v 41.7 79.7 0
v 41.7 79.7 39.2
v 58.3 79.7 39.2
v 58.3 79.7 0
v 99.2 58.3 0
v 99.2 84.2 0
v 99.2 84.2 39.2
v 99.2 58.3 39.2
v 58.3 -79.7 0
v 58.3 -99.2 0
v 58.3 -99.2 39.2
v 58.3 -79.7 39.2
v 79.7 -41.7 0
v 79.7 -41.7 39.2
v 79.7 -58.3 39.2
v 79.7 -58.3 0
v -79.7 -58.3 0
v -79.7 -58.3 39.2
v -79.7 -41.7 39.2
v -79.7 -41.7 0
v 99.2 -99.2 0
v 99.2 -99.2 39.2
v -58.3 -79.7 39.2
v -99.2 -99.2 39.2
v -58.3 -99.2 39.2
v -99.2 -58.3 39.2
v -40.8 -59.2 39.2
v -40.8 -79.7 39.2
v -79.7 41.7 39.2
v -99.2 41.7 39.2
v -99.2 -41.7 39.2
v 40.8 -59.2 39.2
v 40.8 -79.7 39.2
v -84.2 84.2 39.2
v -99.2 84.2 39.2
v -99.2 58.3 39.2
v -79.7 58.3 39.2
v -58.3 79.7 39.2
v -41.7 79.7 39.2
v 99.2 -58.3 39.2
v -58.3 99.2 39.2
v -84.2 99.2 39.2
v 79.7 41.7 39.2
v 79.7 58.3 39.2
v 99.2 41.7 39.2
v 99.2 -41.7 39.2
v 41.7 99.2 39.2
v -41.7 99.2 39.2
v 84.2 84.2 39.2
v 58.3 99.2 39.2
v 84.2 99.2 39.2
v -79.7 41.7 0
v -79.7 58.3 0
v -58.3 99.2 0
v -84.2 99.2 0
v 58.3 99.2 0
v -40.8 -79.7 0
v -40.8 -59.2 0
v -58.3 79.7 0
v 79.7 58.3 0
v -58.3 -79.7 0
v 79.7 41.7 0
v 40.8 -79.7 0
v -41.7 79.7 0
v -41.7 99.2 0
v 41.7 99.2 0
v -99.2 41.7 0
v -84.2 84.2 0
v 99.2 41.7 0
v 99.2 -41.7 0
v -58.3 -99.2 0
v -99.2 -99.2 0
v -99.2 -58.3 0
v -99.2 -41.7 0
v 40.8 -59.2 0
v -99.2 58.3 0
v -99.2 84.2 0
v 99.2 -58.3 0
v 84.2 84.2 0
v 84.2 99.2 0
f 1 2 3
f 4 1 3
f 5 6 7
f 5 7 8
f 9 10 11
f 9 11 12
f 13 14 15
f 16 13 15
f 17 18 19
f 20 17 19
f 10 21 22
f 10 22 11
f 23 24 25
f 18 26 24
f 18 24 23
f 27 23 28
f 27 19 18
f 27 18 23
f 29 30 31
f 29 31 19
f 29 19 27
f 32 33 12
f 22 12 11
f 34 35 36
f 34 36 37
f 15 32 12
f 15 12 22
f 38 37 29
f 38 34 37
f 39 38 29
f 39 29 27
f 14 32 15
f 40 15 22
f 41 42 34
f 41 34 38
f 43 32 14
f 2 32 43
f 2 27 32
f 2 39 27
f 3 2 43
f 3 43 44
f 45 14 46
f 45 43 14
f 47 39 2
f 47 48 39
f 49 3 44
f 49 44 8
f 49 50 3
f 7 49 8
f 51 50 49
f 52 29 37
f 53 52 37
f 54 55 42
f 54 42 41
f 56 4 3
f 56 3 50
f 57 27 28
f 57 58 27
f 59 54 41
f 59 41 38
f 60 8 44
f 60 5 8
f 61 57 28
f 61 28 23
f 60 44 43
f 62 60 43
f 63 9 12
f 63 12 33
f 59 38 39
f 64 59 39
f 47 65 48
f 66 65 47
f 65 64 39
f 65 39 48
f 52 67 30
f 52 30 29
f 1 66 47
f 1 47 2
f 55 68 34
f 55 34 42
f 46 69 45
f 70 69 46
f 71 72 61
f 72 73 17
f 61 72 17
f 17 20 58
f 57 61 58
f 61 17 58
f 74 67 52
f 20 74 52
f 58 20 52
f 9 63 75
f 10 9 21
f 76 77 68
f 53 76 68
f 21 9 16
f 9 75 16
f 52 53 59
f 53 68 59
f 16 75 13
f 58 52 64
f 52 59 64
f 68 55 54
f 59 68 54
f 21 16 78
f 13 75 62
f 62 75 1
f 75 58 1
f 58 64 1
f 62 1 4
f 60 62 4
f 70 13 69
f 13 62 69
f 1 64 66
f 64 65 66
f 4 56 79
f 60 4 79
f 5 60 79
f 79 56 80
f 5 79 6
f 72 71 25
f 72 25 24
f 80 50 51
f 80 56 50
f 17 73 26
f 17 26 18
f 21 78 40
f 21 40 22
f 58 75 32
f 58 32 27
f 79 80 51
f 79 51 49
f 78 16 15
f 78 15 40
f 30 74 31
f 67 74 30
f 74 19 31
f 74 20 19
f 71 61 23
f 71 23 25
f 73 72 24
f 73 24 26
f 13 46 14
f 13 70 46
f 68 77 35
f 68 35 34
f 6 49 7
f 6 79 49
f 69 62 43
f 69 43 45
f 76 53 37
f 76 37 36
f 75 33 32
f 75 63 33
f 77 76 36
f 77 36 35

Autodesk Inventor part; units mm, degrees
ref_plane "YZ Plane" through (0, 0, 0) normal (1, 0, 0) x (0, 1, 0)
ref_plane "XZ Plane" through (0, 0, 0) normal (0, 1, 0) x (-1, 0, 0)
sketch "Boceto1" plane through (0, 0, 0) normal (0, 0, 1) x (1, 0, 0)
  line L0 (40.8, -59.2) -> (-40.8, -59.2) projected
  line L1 (40.8, -79.7) -> (40.8, -59.2) projected
  line L2 (99.2, -99.2) -> (58.3, -99.2) projected
  line L3 (99.2, -58.3) -> (99.2, -99.2) projected
  line L4 (58.3, 99.2) -> (99.2, 99.2) projected
  line L5 (-99.2, 58.3) -> (-99.2, 99.2) projected
  line L6 (-58.3, -99.2) -> (-99.2, -99.2) projected
  line L7 (-40.8, -59.2) -> (-40.8, -79.7) projected
  line L8 (-40.8, -79.7) -> (-58.3, -79.7) projected
  line L9 (58.3, -79.7) -> (40.8, -79.7) projected
  line L10 (58.3, -99.2) -> (58.3, -79.7) projected
  line L11 (79.7, -58.3) -> (99.2, -58.3) projected
  line L12 (79.7, -41.7) -> (79.7, -58.3) projected
  line L13 (99.2, -41.7) -> (79.7, -41.7) projected
  line L14 (99.2, 41.7) -> (99.2, -41.7) projected
  line L15 (79.7, 41.7) -> (99.2, 41.7) projected
  line L16 (79.7, 58.3) -> (79.7, 41.7) projected
  line L17 (99.2, 58.3) -> (79.7, 58.3) projected
  line L18 (99.2, 99.2) -> (99.2, 58.3) projected
  line L19 (58.3, 79.7) -> (58.3, 99.2) projected
  line L20 (41.7, 79.7) -> (58.3, 79.7) projected
  line L21 (41.7, 99.2) -> (41.7, 79.7) projected
  line L22 (-41.7, 99.2) -> (41.7, 99.2) projected
  line L23 (-41.7, 79.7) -> (-41.7, 99.2) projected
  line L24 (-58.3, 79.7) -> (-41.7, 79.7) projected
  line L25 (-58.3, 99.2) -> (-58.3, 79.7) projected
  line L26 (-99.2, 99.2) -> (-58.3, 99.2) projected
  line L27 (-79.7, 58.3) -> (-99.2, 58.3) projected
  line L28 (-79.7, 41.7) -> (-79.7, 58.3) projected
  line L29 (-99.2, 41.7) -> (-79.7, 41.7) projected
  line L30 (-99.2, -41.7) -> (-99.2, 41.7) projected
  line L31 (-79.7, -41.7) -> (-99.2, -41.7) projected
  line L32 (-79.7, -58.3) -> (-79.7, -41.7) projected
  line L33 (-99.2, -58.3) -> (-79.7, -58.3) projected
  line L34 (-99.2, -99.2) -> (-99.2, -58.3) projected
  line L35 (-58.3, -79.7) -> (-58.3, -99.2) projected
  line L36 (99.2, 84.2) -> (99.2, 58.3) projected
  line L37 (84.2, 84.2) -> (99.2, 84.2) projected
  line L38 (84.2, 99.2) -> (84.2, 84.2) projected
  line L39 (58.3, 99.2) -> (84.2, 99.2) projected
  line L40 (58.3, 79.7) -> (58.3, 99.2) projected
  line L41 (41.7, 79.7) -> (58.3, 79.7) projected
  line L42 (41.7, 99.2) -> (41.7, 79.7) projected
  line L43 (-41.7, 99.2) -> (41.7, 99.2) projected
  line L44 (-41.7, 79.7) -> (-41.7, 99.2) projected
  line L45 (-58.3, 79.7) -> (-41.7, 79.7) projected
  line L46 (-58.3, 99.2) -> (-58.3, 79.7) projected
  line L47 (-84.2, 99.2) -> (-58.3, 99.2) projected
  line L48 (-84.2, 84.2) -> (-84.2, 99.2) projected
  line L49 (-99.2, 84.2) -> (-84.2, 84.2) projected
  line L50 (-99.2, 58.3) -> (-99.2, 84.2) projected
  line L51 (-79.7, 58.3) -> (-99.2, 58.3) projected
  line L52 (-79.7, 41.7) -> (-79.7, 58.3) projected
  line L53 (-99.2, 41.7) -> (-79.7, 41.7) projected
  line L54 (-99.2, -41.7) -> (-99.2, 41.7) projected
  line L55 (-79.7, -41.7) -> (-99.2, -41.7) projected
  line L56 (-79.7, -58.3) -> (-79.7, -41.7) projected
  line L57 (-99.2, -58.3) -> (-79.7, -58.3) projected
  line L58 (-99.2, -99.2) -> (-99.2, -58.3) projected
  line L59 (-58.3, -99.2) -> (-99.2, -99.2) projected
  line L60 (-58.3, -79.7) -> (-58.3, -99.2) projected
  line L61 (-40.8, -79.7) -> (-58.3, -79.7) projected
  line L62 (-40.8, -59.2) -> (-40.8, -79.7) projected
  line L63 (40.8, -59.2) -> (-40.8, -59.2) projected
  line L64 (40.8, -79.7) -> (40.8, -59.2) projected
  line L65 (58.3, -79.7) -> (40.8, -79.7) projected
  line L66 (58.3, -99.2) -> (58.3, -79.7) projected
  line L67 (99.2, -99.2) -> (58.3, -99.2) projected
  line L68 (99.2, -58.3) -> (99.2, -99.2) projected
  line L69 (79.7, -58.3) -> (99.2, -58.3) projected
  line L70 (79.7, -41.7) -> (79.7, -58.3) projected
  line L71 (99.2, -41.7) -> (79.7, -41.7) projected
  line L72 (99.2, 41.7) -> (99.2, -41.7) projected
  line L73 (79.7, 41.7) -> (99.2, 41.7) projected
  line L74 (79.7, 58.3) -> (79.7, 41.7) projected
  line L75 (99.2, 58.3) -> (79.7, 58.3) projected
  line L76 (-99.2, 58.3) -> (-99.2, 84.2)
  line L77 (99.2, 84.2) -> (99.2, 58.3) projected
  line L78 (84.2, 84.2) -> (99.2, 84.2) projected
  line L79 (84.2, 99.2) -> (84.2, 84.2) projected
  line L80 (58.3, 99.2) -> (84.2, 99.2) projected
  line L81 (58.3, 79.7) -> (58.3, 99.2) projected
  line L82 (41.7, 79.7) -> (58.3, 79.7) projected
  line L83 (41.7, 99.2) -> (41.7, 79.7) projected
  line L84 (-41.7, 99.2) -> (41.7, 99.2) projected
  line L85 (-41.7, 79.7) -> (-41.7, 99.2) projected
  line L86 (-58.3, 79.7) -> (-41.7, 79.7) projected
  line L87 (-58.3, 99.2) -> (-58.3, 79.7) projected
  line L88 (-84.2, 99.2) -> (-58.3, 99.2) projected
  line L89 (-84.2, 84.2) -> (-84.2, 99.2) projected
  line L90 (-99.2, 84.2) -> (-84.2, 84.2) projected
  line L91 (-99.2, 58.3) -> (-99.2, 84.2) projected
  line L92 (-79.7, 58.3) -> (-99.2, 58.3) projected
  line L93 (-79.7, 41.7) -> (-79.7, 58.3) projected
  line L94 (-99.2, 41.7) -> (-79.7, 41.7) projected
  line L95 (-99.2, -41.7) -> (-99.2, 41.7) projected
  line L96 (-79.7, -41.7) -> (-99.2, -41.7) projected
  line L97 (-79.7, -58.3) -> (-79.7, -41.7) projected
  line L98 (-99.2, -58.3) -> (-79.7, -58.3) projected
  line L99 (-99.2, -99.2) -> (-99.2, -58.3) projected
  line L100 (-58.3, -99.2) -> (-99.2, -99.2) projected
  line L101 (-58.3, -79.7) -> (-58.3, -99.2) projected
  line L102 (-40.8, -79.7) -> (-58.3, -79.7) projected
  line L103 (-40.8, -59.2) -> (-40.8, -79.7) projected
  line L104 (40.8, -59.2) -> (-40.8, -59.2) projected
  line L105 (40.8, -79.7) -> (40.8, -59.2) projected
  line L106 (58.3, -79.7) -> (40.8, -79.7) projected
  line L107 (58.3, -99.2) -> (58.3, -79.7) projected
  line L108 (99.2, -99.2) -> (58.3, -99.2) projected
  line L109 (99.2, -58.3) -> (99.2, -99.2) projected
  line L110 (79.7, -58.3) -> (99.2, -58.3) projected
  line L111 (79.7, -41.7) -> (79.7, -58.3) projected
  line L112 (99.2, -41.7) -> (79.7, -41.7) projected
  line L113 (99.2, 41.7) -> (99.2, -41.7) projected
  line L114 (79.7, 41.7) -> (99.2, 41.7) projected
  line L115 (79.7, 58.3) -> (79.7, 41.7) projected
  line L116 (99.2, 58.3) -> (79.7, 58.3) projected
  line L117 (99.2, 84.2) -> (99.2, 58.3) projected
  line L118 (84.2, 84.2) -> (99.2, 84.2) projected
  line L119 (84.2, 99.2) -> (84.2, 84.2) projected
  line L120 (58.3, 99.2) -> (84.2, 99.2) projected
  line L121 (58.3, 79.7) -> (58.3, 99.2) projected
  line L122 (41.7, 79.7) -> (58.3, 79.7) projected
  line L123 (41.7, 99.2) -> (41.7, 79.7) projected
  line L124 (-41.7, 99.2) -> (41.7, 99.2) projected
  line L125 (-41.7, 79.7) -> (-41.7, 99.2) projected
  line L126 (-58.3, 79.7) -> (-41.7, 79.7) projected
  line L127 (-58.3, 99.2) -> (-58.3, 79.7) projected
  line L128 (-84.2, 99.2) -> (-58.3, 99.2) projected
  line L129 (-84.2, 84.2) -> (-84.2, 99.2) projected
  line L130 (-99.2, 84.2) -> (-84.2, 84.2) projected
  line L131 (-99.2, 58.3) -> (-99.2, 84.2) projected
  line L132 (-79.7, 58.3) -> (-99.2, 58.3) projected
  line L133 (-79.7, 41.7) -> (-79.7, 58.3) projected
  line L134 (-99.2, 41.7) -> (-79.7, 41.7) projected
  line L135 (-99.2, -41.7) -> (-99.2, 41.7) projected
  line L136 (-79.7, -41.7) -> (-99.2, -41.7) projected
  line L137 (-79.7, -58.3) -> (-79.7, -41.7) projected
  line L138 (-99.2, -58.3) -> (-79.7, -58.3) projected
  line L139 (-99.2, -99.2) -> (-99.2, -58.3) projected
  line L140 (-58.3, -99.2) -> (-99.2, -99.2) projected
  line L141 (-58.3, -79.7) -> (-58.3, -99.2) projected
  line L142 (-40.8, -79.7) -> (-58.3, -79.7) projected
  line L143 (-40.8, -59.2) -> (-40.8, -79.7) projected
  line L144 (40.8, -59.2) -> (-40.8, -59.2) projected
  line L145 (40.8, -79.7) -> (40.8, -59.2) projected
  line L146 (58.3, -79.7) -> (40.8, -79.7) projected
  line L147 (58.3, -99.2) -> (58.3, -79.7) projected
  line L148 (99.2, -99.2) -> (58.3, -99.2) projected
  line L149 (99.2, -58.3) -> (99.2, -99.2) projected
  line L150 (79.7, -58.3) -> (99.2, -58.3) projected
  line L151 (79.7, -41.7) -> (79.7, -58.3) projected
  line L152 (99.2, -41.7) -> (79.7, -41.7) projected
  line L153 (99.2, 41.7) -> (99.2, -41.7) projected
  line L154 (79.7, 41.7) -> (99.2, 41.7) projected
  line L155 (79.7, 58.3) -> (79.7, 41.7) projected
  line L156 (99.2, 58.3) -> (79.7, 58.3) projected
  point P0 (0, 0)
ref_plane "Plano de trabajo1" through (-100, -100, 39.2) normal (0, 0, 1) x (1, 0, 0)
extrude "Extrusión1" add sketch "Boceto1" along normal up to surface (39.2 mm away) contours L0 L7 L8 L35 L6 L34 L33 L32 L31 L30 L29 L28 L27 L5 L49 L48 L26 L25 L24 L23 L22 L21 L20 L19 L4 L38 L37 L18 L17 L16 L15 L14 L13 L12 L11 L3 L2 L10 L9 L1
properties part number "Cemento"
